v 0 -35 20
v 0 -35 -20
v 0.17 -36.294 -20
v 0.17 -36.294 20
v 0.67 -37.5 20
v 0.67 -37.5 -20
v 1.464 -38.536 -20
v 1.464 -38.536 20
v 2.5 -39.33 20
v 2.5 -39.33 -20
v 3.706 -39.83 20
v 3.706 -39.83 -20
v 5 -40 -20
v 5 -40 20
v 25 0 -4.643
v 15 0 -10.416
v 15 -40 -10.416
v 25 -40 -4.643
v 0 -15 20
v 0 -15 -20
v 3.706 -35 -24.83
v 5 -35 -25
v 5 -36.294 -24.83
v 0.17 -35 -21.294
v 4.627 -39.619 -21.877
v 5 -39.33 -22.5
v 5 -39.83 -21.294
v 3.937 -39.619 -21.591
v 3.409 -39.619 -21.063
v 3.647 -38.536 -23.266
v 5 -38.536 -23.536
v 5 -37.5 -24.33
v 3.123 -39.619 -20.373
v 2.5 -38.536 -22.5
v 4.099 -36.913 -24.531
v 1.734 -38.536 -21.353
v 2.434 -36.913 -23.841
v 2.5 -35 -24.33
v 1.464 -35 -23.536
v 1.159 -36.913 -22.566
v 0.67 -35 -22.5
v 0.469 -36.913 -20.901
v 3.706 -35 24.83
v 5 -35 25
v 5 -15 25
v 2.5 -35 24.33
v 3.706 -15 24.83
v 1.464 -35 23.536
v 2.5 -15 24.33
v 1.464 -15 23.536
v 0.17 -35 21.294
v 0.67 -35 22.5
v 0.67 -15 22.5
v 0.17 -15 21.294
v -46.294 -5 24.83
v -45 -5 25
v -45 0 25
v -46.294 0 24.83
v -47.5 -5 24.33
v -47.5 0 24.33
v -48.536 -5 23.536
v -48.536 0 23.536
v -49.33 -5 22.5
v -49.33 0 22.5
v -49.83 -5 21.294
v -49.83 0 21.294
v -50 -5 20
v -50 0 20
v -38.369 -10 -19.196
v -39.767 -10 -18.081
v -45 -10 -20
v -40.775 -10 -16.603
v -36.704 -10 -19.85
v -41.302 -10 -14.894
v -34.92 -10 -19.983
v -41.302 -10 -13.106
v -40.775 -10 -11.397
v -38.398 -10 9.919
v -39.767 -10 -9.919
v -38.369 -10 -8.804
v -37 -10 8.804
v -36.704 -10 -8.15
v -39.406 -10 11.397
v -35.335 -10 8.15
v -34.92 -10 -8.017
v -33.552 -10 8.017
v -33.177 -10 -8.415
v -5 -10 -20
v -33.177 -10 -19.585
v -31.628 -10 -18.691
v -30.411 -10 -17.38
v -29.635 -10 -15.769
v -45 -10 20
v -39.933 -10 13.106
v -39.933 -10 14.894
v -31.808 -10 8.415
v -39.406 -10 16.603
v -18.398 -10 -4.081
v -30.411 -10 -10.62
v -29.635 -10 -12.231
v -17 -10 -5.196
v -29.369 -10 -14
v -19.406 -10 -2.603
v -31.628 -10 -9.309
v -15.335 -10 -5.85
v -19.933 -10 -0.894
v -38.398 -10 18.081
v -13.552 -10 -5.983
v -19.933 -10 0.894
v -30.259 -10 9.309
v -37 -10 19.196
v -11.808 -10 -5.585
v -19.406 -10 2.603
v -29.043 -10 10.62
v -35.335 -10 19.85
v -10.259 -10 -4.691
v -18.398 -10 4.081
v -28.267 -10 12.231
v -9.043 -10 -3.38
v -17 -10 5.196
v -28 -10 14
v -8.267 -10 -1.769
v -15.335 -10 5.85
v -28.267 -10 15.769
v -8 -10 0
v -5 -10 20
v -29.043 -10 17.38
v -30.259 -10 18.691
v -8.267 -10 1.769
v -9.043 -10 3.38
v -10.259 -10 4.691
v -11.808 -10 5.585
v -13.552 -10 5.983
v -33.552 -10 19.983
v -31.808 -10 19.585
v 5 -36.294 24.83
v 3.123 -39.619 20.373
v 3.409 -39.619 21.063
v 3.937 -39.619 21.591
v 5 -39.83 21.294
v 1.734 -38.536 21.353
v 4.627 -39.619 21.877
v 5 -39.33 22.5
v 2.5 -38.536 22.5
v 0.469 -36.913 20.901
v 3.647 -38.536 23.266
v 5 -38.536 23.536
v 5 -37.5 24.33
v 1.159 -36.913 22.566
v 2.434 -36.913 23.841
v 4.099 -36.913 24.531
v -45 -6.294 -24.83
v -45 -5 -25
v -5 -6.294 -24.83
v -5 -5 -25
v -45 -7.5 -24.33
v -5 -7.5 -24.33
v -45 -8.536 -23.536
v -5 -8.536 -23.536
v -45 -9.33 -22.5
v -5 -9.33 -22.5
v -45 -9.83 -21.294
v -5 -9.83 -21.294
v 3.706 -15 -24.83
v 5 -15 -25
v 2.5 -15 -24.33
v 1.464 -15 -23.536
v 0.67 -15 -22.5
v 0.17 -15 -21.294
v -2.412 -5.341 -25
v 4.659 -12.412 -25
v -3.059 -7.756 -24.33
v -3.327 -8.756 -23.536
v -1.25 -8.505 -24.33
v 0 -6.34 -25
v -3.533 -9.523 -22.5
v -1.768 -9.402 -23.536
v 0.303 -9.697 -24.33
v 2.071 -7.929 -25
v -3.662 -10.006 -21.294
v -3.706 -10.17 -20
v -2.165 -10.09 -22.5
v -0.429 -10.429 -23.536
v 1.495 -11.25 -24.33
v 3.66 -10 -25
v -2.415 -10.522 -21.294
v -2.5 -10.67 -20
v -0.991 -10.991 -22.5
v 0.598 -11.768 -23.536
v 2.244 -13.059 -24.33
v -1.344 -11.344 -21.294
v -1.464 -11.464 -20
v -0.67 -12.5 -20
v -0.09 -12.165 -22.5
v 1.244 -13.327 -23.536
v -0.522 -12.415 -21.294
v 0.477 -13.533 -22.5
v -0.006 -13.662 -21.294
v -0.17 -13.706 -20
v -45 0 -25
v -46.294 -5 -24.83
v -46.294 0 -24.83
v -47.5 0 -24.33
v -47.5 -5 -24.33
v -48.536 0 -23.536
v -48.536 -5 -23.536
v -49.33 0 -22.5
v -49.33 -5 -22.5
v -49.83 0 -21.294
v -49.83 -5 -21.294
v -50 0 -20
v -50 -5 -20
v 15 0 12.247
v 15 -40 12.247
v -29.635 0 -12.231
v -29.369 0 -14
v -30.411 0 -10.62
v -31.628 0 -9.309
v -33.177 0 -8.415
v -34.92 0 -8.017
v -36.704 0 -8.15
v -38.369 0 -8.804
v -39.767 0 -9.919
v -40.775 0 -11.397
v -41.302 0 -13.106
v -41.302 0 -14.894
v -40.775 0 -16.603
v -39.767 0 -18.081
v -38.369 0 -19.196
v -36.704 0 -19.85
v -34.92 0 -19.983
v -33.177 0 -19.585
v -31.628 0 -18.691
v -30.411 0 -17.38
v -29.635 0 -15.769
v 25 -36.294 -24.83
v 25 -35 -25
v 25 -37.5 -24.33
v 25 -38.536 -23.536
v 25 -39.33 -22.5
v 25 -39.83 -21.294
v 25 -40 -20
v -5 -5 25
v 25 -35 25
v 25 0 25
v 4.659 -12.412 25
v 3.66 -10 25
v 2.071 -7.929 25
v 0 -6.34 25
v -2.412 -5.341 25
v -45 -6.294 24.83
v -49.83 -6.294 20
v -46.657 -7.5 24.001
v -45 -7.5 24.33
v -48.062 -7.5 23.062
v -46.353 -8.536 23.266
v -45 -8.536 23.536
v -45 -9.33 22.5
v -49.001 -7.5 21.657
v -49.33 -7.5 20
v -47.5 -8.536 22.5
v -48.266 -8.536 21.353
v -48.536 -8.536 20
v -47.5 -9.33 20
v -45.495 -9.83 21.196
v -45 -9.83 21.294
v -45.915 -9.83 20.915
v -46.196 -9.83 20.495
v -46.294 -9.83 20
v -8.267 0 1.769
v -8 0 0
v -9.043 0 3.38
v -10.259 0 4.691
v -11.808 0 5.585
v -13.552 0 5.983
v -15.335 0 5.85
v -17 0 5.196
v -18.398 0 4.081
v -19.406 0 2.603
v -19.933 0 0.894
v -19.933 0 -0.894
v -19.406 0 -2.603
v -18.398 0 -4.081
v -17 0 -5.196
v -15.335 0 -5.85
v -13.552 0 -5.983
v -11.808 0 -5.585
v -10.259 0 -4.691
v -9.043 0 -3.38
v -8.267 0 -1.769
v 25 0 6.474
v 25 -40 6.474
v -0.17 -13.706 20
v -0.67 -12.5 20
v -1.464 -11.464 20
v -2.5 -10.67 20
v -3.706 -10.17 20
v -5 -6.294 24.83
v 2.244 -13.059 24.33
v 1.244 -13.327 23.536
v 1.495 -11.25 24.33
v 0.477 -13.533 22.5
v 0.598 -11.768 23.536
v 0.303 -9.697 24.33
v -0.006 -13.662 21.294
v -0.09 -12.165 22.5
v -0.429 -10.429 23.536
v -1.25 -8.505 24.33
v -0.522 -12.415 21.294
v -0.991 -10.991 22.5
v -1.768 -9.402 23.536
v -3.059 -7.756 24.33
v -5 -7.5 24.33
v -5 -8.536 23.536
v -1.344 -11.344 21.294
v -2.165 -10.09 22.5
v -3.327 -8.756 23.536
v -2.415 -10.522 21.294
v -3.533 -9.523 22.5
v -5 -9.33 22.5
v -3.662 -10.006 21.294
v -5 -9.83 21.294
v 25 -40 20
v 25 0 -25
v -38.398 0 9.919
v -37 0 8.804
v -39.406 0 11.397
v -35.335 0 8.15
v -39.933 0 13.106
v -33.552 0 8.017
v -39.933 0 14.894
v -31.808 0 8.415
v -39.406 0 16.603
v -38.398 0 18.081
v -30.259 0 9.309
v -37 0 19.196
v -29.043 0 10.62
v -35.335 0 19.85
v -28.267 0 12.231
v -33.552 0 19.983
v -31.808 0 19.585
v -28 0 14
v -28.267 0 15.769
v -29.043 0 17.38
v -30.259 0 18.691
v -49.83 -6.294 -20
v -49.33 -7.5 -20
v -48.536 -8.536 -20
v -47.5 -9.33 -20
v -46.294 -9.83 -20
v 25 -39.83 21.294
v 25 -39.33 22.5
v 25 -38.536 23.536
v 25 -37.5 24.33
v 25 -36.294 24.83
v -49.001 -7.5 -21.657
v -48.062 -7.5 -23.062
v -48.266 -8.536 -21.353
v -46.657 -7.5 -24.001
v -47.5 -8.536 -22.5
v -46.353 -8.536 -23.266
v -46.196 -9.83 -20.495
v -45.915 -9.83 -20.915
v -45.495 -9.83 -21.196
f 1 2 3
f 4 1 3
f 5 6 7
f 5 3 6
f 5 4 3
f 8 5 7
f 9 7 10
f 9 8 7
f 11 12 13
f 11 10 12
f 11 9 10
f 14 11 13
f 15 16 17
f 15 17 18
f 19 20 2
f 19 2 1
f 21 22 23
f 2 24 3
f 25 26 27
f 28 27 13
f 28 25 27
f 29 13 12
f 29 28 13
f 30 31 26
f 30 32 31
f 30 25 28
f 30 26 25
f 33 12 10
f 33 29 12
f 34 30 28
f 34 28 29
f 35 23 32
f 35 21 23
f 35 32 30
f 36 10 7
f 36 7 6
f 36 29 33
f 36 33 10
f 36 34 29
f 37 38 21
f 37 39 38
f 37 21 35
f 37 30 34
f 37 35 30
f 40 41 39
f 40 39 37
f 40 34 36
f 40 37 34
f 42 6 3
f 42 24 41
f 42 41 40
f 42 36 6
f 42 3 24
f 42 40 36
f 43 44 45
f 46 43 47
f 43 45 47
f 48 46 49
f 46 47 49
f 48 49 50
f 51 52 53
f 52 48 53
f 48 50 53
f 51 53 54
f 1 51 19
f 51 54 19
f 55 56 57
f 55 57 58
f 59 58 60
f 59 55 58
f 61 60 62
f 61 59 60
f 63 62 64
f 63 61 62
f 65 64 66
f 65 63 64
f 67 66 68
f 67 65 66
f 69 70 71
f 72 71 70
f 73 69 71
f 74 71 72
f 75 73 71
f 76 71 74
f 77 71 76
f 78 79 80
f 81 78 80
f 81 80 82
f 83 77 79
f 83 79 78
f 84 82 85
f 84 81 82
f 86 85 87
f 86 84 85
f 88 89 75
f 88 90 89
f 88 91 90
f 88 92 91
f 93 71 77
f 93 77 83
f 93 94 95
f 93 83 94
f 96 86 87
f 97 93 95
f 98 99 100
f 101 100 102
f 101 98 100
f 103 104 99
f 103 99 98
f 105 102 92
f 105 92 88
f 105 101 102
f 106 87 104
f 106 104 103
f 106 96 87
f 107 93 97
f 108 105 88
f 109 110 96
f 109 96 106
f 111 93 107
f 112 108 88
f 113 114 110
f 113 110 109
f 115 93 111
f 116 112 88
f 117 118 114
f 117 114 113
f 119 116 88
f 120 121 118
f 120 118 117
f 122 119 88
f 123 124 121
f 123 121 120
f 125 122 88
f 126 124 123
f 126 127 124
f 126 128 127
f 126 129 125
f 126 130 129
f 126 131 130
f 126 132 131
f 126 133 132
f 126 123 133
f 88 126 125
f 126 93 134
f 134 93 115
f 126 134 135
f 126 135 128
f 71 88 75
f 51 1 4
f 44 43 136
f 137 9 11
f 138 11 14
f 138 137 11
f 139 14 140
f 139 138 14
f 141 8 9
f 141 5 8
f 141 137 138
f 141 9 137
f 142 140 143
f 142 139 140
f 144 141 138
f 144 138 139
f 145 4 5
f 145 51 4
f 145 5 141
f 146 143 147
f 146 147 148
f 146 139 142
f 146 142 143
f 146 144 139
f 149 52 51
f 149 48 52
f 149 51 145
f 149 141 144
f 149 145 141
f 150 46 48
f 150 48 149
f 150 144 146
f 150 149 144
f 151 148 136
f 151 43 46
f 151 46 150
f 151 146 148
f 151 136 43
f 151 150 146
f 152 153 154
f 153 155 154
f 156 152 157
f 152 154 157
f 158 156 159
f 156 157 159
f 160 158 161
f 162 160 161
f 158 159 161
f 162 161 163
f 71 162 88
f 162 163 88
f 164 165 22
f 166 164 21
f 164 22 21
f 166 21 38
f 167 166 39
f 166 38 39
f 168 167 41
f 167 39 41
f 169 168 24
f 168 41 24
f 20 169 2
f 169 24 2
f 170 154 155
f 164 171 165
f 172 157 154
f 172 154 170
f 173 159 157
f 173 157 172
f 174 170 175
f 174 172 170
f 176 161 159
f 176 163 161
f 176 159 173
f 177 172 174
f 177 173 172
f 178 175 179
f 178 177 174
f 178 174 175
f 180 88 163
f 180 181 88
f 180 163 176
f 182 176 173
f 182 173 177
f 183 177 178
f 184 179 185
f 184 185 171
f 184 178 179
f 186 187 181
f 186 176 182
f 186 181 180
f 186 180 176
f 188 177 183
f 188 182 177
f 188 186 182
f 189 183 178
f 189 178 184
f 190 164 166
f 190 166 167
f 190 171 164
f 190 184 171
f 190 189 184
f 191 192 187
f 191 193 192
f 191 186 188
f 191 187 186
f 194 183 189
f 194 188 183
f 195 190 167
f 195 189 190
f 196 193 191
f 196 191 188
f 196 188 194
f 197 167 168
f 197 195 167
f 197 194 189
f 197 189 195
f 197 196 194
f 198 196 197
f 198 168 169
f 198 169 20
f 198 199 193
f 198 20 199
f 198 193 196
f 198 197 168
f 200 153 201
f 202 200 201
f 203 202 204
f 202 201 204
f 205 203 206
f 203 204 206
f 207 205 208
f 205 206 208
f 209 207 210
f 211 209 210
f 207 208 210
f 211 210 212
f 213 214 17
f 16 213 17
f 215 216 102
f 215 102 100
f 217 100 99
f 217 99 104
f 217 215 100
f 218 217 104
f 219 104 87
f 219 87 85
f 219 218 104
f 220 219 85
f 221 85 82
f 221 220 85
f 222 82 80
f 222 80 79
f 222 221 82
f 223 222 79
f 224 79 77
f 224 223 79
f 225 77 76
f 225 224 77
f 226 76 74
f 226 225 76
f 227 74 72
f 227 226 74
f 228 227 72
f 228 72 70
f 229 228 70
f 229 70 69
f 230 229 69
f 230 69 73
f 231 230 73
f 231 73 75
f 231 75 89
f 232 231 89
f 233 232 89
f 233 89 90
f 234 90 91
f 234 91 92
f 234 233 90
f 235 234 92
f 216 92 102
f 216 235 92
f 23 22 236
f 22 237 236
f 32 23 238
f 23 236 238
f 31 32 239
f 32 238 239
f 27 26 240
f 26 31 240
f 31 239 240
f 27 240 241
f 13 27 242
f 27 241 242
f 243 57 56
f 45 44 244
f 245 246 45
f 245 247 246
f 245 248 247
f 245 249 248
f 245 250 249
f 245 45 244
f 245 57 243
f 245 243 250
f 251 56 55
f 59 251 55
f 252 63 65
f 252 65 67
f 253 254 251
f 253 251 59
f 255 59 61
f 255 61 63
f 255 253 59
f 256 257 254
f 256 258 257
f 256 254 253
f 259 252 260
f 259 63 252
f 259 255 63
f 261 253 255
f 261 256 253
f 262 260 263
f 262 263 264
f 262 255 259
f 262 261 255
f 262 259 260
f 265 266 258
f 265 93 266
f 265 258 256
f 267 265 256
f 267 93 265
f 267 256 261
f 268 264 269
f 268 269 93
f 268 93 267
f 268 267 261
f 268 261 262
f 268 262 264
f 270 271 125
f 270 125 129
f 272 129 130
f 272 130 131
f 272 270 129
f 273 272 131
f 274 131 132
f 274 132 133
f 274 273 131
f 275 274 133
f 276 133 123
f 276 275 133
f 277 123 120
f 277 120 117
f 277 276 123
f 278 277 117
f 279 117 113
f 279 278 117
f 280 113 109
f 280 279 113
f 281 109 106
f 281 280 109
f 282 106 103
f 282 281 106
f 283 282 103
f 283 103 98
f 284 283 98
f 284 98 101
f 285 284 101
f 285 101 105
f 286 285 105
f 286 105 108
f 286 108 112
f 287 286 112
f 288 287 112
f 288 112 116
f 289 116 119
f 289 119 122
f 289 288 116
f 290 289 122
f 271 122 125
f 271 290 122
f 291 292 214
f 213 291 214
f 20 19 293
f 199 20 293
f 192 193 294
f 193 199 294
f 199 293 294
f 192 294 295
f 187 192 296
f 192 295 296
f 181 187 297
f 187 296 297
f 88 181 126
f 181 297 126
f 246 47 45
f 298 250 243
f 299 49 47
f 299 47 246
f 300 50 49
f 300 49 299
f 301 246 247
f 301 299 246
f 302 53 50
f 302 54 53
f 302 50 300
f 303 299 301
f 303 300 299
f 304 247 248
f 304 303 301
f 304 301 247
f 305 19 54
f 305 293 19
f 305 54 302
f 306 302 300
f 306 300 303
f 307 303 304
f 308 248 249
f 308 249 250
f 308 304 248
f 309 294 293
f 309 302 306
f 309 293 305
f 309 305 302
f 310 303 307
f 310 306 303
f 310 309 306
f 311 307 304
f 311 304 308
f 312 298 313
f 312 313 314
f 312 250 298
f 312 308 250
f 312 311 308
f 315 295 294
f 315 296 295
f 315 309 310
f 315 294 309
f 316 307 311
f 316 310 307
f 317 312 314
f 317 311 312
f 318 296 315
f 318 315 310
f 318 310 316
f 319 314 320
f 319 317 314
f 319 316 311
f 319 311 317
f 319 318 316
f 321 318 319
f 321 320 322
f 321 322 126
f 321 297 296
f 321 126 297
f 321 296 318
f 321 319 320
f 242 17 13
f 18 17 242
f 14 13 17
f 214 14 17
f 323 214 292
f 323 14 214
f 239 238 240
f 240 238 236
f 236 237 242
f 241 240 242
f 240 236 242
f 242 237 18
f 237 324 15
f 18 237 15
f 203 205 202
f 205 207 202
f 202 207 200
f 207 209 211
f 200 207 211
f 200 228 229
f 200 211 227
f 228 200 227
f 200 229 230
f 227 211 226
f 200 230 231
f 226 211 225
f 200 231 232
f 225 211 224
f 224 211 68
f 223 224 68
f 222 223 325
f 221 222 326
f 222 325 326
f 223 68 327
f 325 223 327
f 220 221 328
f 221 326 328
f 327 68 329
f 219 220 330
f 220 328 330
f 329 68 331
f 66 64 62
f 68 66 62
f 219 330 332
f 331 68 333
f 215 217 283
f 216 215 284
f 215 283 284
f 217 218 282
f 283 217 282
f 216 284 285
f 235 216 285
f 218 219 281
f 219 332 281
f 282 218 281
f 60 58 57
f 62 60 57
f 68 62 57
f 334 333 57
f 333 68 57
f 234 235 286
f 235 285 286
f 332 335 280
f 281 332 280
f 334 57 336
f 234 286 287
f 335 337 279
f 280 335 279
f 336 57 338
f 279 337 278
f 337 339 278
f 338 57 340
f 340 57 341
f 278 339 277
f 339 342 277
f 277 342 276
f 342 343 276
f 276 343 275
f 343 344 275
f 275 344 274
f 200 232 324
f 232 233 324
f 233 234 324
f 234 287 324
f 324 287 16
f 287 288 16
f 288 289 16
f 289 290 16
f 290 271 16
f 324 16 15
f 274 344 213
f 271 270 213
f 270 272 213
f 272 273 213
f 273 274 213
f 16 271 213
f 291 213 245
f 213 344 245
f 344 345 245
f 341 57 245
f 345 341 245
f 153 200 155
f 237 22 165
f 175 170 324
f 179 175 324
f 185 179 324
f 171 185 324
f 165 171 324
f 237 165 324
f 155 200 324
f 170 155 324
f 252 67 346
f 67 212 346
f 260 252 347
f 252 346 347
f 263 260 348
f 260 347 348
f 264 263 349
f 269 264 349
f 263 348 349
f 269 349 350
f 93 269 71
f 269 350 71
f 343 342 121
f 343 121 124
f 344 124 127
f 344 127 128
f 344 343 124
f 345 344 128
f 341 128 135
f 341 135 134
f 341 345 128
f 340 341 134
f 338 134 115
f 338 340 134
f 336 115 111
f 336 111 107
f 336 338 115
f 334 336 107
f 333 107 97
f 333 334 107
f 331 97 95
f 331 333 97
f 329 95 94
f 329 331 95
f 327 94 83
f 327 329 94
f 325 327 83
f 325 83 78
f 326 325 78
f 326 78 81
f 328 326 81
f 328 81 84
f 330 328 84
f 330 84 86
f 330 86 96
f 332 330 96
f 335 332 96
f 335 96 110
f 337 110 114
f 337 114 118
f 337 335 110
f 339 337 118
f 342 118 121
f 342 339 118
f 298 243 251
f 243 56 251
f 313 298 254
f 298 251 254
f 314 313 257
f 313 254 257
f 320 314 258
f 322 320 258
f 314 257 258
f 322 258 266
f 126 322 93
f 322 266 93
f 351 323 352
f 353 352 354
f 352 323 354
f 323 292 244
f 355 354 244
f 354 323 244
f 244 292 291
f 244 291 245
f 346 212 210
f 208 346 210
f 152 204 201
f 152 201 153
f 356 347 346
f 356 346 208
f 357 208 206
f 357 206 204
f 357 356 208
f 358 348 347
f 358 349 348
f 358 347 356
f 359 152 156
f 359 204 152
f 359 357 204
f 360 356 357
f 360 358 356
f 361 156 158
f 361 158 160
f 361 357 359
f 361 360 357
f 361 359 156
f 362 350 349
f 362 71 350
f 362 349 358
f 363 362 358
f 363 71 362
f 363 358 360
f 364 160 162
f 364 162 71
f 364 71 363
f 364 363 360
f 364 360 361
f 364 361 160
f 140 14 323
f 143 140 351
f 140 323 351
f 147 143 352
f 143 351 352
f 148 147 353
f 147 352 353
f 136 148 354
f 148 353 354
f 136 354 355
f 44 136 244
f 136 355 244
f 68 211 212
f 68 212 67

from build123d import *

# Parameters (mm, degrees)
F0_W     = 75
F0_H     = 50
F0_R     = 6
F1_DEPTH = 10
F2_W     = 25
F2_H     = 50
F3_DEPTH = 30
F5_DEPTH = 40.001
F6_R     = 5
F7_R     = 4.99999


# Not quite as in the source:
# - a fillet or chamfer is up to 0.001 mm smaller than in the source, because OpenCascade refuses the exact size


with BuildPart() as f1:
    # F0 (on Front) → F1 (new body)
    with BuildSketch(Plane.XZ):
        with Locations((-12.5, 0)):
            Rectangle(F0_W, F0_H)
        with Locations((-35.368822515, -14)):
            Circle(F0_R, mode=Mode.SUBTRACT)
        with Locations((-14, 0)):
            Circle(F0_R, mode=Mode.SUBTRACT)
        with Locations((-34, 14)):
            Circle(F0_R, mode=Mode.SUBTRACT)
    extrude(amount=F1_DEPTH)

    # F2 (on face) → F3 (join)
    with BuildSketch(Plane.XZ.offset(10)):
        with Locations((12.5, 0)):
            Rectangle(F2_W, F2_H)
    extrude(amount=F3_DEPTH)

    # F4 (on face) → F5 (cut, through all)
    with BuildSketch(Plane.XZ.offset(40)):
        Polygon((25, -4.6425589255), (25, 6.4739544771), (15, 12.247457169), (15, -10.4160616174), align=None)
    extrude(amount=-F5_DEPTH, mode=Mode.SUBTRACT)

    # F6
    f6_edges = [f1.edges().sort_by_distance(p)[0] for p in [
        (-50, -5, -25),
        (-50, -5, 25),
        (0, -10, 0),
    ]]
    fillet(f6_edges, radius=F6_R)

    # F7 (radius 5 in the source; OpenCascade refuses exactly that, so slightly less here)
    f7_edges = [f1.edges().sort_by_distance(p)[0] for p in [
        (-25, -10, -25),
        (12.5, -40, -25),
        (0, -40, 0),
        (12.5, -40, 25),
    ]]
    fillet(f7_edges, radius=F7_R)


solid = f1.part
